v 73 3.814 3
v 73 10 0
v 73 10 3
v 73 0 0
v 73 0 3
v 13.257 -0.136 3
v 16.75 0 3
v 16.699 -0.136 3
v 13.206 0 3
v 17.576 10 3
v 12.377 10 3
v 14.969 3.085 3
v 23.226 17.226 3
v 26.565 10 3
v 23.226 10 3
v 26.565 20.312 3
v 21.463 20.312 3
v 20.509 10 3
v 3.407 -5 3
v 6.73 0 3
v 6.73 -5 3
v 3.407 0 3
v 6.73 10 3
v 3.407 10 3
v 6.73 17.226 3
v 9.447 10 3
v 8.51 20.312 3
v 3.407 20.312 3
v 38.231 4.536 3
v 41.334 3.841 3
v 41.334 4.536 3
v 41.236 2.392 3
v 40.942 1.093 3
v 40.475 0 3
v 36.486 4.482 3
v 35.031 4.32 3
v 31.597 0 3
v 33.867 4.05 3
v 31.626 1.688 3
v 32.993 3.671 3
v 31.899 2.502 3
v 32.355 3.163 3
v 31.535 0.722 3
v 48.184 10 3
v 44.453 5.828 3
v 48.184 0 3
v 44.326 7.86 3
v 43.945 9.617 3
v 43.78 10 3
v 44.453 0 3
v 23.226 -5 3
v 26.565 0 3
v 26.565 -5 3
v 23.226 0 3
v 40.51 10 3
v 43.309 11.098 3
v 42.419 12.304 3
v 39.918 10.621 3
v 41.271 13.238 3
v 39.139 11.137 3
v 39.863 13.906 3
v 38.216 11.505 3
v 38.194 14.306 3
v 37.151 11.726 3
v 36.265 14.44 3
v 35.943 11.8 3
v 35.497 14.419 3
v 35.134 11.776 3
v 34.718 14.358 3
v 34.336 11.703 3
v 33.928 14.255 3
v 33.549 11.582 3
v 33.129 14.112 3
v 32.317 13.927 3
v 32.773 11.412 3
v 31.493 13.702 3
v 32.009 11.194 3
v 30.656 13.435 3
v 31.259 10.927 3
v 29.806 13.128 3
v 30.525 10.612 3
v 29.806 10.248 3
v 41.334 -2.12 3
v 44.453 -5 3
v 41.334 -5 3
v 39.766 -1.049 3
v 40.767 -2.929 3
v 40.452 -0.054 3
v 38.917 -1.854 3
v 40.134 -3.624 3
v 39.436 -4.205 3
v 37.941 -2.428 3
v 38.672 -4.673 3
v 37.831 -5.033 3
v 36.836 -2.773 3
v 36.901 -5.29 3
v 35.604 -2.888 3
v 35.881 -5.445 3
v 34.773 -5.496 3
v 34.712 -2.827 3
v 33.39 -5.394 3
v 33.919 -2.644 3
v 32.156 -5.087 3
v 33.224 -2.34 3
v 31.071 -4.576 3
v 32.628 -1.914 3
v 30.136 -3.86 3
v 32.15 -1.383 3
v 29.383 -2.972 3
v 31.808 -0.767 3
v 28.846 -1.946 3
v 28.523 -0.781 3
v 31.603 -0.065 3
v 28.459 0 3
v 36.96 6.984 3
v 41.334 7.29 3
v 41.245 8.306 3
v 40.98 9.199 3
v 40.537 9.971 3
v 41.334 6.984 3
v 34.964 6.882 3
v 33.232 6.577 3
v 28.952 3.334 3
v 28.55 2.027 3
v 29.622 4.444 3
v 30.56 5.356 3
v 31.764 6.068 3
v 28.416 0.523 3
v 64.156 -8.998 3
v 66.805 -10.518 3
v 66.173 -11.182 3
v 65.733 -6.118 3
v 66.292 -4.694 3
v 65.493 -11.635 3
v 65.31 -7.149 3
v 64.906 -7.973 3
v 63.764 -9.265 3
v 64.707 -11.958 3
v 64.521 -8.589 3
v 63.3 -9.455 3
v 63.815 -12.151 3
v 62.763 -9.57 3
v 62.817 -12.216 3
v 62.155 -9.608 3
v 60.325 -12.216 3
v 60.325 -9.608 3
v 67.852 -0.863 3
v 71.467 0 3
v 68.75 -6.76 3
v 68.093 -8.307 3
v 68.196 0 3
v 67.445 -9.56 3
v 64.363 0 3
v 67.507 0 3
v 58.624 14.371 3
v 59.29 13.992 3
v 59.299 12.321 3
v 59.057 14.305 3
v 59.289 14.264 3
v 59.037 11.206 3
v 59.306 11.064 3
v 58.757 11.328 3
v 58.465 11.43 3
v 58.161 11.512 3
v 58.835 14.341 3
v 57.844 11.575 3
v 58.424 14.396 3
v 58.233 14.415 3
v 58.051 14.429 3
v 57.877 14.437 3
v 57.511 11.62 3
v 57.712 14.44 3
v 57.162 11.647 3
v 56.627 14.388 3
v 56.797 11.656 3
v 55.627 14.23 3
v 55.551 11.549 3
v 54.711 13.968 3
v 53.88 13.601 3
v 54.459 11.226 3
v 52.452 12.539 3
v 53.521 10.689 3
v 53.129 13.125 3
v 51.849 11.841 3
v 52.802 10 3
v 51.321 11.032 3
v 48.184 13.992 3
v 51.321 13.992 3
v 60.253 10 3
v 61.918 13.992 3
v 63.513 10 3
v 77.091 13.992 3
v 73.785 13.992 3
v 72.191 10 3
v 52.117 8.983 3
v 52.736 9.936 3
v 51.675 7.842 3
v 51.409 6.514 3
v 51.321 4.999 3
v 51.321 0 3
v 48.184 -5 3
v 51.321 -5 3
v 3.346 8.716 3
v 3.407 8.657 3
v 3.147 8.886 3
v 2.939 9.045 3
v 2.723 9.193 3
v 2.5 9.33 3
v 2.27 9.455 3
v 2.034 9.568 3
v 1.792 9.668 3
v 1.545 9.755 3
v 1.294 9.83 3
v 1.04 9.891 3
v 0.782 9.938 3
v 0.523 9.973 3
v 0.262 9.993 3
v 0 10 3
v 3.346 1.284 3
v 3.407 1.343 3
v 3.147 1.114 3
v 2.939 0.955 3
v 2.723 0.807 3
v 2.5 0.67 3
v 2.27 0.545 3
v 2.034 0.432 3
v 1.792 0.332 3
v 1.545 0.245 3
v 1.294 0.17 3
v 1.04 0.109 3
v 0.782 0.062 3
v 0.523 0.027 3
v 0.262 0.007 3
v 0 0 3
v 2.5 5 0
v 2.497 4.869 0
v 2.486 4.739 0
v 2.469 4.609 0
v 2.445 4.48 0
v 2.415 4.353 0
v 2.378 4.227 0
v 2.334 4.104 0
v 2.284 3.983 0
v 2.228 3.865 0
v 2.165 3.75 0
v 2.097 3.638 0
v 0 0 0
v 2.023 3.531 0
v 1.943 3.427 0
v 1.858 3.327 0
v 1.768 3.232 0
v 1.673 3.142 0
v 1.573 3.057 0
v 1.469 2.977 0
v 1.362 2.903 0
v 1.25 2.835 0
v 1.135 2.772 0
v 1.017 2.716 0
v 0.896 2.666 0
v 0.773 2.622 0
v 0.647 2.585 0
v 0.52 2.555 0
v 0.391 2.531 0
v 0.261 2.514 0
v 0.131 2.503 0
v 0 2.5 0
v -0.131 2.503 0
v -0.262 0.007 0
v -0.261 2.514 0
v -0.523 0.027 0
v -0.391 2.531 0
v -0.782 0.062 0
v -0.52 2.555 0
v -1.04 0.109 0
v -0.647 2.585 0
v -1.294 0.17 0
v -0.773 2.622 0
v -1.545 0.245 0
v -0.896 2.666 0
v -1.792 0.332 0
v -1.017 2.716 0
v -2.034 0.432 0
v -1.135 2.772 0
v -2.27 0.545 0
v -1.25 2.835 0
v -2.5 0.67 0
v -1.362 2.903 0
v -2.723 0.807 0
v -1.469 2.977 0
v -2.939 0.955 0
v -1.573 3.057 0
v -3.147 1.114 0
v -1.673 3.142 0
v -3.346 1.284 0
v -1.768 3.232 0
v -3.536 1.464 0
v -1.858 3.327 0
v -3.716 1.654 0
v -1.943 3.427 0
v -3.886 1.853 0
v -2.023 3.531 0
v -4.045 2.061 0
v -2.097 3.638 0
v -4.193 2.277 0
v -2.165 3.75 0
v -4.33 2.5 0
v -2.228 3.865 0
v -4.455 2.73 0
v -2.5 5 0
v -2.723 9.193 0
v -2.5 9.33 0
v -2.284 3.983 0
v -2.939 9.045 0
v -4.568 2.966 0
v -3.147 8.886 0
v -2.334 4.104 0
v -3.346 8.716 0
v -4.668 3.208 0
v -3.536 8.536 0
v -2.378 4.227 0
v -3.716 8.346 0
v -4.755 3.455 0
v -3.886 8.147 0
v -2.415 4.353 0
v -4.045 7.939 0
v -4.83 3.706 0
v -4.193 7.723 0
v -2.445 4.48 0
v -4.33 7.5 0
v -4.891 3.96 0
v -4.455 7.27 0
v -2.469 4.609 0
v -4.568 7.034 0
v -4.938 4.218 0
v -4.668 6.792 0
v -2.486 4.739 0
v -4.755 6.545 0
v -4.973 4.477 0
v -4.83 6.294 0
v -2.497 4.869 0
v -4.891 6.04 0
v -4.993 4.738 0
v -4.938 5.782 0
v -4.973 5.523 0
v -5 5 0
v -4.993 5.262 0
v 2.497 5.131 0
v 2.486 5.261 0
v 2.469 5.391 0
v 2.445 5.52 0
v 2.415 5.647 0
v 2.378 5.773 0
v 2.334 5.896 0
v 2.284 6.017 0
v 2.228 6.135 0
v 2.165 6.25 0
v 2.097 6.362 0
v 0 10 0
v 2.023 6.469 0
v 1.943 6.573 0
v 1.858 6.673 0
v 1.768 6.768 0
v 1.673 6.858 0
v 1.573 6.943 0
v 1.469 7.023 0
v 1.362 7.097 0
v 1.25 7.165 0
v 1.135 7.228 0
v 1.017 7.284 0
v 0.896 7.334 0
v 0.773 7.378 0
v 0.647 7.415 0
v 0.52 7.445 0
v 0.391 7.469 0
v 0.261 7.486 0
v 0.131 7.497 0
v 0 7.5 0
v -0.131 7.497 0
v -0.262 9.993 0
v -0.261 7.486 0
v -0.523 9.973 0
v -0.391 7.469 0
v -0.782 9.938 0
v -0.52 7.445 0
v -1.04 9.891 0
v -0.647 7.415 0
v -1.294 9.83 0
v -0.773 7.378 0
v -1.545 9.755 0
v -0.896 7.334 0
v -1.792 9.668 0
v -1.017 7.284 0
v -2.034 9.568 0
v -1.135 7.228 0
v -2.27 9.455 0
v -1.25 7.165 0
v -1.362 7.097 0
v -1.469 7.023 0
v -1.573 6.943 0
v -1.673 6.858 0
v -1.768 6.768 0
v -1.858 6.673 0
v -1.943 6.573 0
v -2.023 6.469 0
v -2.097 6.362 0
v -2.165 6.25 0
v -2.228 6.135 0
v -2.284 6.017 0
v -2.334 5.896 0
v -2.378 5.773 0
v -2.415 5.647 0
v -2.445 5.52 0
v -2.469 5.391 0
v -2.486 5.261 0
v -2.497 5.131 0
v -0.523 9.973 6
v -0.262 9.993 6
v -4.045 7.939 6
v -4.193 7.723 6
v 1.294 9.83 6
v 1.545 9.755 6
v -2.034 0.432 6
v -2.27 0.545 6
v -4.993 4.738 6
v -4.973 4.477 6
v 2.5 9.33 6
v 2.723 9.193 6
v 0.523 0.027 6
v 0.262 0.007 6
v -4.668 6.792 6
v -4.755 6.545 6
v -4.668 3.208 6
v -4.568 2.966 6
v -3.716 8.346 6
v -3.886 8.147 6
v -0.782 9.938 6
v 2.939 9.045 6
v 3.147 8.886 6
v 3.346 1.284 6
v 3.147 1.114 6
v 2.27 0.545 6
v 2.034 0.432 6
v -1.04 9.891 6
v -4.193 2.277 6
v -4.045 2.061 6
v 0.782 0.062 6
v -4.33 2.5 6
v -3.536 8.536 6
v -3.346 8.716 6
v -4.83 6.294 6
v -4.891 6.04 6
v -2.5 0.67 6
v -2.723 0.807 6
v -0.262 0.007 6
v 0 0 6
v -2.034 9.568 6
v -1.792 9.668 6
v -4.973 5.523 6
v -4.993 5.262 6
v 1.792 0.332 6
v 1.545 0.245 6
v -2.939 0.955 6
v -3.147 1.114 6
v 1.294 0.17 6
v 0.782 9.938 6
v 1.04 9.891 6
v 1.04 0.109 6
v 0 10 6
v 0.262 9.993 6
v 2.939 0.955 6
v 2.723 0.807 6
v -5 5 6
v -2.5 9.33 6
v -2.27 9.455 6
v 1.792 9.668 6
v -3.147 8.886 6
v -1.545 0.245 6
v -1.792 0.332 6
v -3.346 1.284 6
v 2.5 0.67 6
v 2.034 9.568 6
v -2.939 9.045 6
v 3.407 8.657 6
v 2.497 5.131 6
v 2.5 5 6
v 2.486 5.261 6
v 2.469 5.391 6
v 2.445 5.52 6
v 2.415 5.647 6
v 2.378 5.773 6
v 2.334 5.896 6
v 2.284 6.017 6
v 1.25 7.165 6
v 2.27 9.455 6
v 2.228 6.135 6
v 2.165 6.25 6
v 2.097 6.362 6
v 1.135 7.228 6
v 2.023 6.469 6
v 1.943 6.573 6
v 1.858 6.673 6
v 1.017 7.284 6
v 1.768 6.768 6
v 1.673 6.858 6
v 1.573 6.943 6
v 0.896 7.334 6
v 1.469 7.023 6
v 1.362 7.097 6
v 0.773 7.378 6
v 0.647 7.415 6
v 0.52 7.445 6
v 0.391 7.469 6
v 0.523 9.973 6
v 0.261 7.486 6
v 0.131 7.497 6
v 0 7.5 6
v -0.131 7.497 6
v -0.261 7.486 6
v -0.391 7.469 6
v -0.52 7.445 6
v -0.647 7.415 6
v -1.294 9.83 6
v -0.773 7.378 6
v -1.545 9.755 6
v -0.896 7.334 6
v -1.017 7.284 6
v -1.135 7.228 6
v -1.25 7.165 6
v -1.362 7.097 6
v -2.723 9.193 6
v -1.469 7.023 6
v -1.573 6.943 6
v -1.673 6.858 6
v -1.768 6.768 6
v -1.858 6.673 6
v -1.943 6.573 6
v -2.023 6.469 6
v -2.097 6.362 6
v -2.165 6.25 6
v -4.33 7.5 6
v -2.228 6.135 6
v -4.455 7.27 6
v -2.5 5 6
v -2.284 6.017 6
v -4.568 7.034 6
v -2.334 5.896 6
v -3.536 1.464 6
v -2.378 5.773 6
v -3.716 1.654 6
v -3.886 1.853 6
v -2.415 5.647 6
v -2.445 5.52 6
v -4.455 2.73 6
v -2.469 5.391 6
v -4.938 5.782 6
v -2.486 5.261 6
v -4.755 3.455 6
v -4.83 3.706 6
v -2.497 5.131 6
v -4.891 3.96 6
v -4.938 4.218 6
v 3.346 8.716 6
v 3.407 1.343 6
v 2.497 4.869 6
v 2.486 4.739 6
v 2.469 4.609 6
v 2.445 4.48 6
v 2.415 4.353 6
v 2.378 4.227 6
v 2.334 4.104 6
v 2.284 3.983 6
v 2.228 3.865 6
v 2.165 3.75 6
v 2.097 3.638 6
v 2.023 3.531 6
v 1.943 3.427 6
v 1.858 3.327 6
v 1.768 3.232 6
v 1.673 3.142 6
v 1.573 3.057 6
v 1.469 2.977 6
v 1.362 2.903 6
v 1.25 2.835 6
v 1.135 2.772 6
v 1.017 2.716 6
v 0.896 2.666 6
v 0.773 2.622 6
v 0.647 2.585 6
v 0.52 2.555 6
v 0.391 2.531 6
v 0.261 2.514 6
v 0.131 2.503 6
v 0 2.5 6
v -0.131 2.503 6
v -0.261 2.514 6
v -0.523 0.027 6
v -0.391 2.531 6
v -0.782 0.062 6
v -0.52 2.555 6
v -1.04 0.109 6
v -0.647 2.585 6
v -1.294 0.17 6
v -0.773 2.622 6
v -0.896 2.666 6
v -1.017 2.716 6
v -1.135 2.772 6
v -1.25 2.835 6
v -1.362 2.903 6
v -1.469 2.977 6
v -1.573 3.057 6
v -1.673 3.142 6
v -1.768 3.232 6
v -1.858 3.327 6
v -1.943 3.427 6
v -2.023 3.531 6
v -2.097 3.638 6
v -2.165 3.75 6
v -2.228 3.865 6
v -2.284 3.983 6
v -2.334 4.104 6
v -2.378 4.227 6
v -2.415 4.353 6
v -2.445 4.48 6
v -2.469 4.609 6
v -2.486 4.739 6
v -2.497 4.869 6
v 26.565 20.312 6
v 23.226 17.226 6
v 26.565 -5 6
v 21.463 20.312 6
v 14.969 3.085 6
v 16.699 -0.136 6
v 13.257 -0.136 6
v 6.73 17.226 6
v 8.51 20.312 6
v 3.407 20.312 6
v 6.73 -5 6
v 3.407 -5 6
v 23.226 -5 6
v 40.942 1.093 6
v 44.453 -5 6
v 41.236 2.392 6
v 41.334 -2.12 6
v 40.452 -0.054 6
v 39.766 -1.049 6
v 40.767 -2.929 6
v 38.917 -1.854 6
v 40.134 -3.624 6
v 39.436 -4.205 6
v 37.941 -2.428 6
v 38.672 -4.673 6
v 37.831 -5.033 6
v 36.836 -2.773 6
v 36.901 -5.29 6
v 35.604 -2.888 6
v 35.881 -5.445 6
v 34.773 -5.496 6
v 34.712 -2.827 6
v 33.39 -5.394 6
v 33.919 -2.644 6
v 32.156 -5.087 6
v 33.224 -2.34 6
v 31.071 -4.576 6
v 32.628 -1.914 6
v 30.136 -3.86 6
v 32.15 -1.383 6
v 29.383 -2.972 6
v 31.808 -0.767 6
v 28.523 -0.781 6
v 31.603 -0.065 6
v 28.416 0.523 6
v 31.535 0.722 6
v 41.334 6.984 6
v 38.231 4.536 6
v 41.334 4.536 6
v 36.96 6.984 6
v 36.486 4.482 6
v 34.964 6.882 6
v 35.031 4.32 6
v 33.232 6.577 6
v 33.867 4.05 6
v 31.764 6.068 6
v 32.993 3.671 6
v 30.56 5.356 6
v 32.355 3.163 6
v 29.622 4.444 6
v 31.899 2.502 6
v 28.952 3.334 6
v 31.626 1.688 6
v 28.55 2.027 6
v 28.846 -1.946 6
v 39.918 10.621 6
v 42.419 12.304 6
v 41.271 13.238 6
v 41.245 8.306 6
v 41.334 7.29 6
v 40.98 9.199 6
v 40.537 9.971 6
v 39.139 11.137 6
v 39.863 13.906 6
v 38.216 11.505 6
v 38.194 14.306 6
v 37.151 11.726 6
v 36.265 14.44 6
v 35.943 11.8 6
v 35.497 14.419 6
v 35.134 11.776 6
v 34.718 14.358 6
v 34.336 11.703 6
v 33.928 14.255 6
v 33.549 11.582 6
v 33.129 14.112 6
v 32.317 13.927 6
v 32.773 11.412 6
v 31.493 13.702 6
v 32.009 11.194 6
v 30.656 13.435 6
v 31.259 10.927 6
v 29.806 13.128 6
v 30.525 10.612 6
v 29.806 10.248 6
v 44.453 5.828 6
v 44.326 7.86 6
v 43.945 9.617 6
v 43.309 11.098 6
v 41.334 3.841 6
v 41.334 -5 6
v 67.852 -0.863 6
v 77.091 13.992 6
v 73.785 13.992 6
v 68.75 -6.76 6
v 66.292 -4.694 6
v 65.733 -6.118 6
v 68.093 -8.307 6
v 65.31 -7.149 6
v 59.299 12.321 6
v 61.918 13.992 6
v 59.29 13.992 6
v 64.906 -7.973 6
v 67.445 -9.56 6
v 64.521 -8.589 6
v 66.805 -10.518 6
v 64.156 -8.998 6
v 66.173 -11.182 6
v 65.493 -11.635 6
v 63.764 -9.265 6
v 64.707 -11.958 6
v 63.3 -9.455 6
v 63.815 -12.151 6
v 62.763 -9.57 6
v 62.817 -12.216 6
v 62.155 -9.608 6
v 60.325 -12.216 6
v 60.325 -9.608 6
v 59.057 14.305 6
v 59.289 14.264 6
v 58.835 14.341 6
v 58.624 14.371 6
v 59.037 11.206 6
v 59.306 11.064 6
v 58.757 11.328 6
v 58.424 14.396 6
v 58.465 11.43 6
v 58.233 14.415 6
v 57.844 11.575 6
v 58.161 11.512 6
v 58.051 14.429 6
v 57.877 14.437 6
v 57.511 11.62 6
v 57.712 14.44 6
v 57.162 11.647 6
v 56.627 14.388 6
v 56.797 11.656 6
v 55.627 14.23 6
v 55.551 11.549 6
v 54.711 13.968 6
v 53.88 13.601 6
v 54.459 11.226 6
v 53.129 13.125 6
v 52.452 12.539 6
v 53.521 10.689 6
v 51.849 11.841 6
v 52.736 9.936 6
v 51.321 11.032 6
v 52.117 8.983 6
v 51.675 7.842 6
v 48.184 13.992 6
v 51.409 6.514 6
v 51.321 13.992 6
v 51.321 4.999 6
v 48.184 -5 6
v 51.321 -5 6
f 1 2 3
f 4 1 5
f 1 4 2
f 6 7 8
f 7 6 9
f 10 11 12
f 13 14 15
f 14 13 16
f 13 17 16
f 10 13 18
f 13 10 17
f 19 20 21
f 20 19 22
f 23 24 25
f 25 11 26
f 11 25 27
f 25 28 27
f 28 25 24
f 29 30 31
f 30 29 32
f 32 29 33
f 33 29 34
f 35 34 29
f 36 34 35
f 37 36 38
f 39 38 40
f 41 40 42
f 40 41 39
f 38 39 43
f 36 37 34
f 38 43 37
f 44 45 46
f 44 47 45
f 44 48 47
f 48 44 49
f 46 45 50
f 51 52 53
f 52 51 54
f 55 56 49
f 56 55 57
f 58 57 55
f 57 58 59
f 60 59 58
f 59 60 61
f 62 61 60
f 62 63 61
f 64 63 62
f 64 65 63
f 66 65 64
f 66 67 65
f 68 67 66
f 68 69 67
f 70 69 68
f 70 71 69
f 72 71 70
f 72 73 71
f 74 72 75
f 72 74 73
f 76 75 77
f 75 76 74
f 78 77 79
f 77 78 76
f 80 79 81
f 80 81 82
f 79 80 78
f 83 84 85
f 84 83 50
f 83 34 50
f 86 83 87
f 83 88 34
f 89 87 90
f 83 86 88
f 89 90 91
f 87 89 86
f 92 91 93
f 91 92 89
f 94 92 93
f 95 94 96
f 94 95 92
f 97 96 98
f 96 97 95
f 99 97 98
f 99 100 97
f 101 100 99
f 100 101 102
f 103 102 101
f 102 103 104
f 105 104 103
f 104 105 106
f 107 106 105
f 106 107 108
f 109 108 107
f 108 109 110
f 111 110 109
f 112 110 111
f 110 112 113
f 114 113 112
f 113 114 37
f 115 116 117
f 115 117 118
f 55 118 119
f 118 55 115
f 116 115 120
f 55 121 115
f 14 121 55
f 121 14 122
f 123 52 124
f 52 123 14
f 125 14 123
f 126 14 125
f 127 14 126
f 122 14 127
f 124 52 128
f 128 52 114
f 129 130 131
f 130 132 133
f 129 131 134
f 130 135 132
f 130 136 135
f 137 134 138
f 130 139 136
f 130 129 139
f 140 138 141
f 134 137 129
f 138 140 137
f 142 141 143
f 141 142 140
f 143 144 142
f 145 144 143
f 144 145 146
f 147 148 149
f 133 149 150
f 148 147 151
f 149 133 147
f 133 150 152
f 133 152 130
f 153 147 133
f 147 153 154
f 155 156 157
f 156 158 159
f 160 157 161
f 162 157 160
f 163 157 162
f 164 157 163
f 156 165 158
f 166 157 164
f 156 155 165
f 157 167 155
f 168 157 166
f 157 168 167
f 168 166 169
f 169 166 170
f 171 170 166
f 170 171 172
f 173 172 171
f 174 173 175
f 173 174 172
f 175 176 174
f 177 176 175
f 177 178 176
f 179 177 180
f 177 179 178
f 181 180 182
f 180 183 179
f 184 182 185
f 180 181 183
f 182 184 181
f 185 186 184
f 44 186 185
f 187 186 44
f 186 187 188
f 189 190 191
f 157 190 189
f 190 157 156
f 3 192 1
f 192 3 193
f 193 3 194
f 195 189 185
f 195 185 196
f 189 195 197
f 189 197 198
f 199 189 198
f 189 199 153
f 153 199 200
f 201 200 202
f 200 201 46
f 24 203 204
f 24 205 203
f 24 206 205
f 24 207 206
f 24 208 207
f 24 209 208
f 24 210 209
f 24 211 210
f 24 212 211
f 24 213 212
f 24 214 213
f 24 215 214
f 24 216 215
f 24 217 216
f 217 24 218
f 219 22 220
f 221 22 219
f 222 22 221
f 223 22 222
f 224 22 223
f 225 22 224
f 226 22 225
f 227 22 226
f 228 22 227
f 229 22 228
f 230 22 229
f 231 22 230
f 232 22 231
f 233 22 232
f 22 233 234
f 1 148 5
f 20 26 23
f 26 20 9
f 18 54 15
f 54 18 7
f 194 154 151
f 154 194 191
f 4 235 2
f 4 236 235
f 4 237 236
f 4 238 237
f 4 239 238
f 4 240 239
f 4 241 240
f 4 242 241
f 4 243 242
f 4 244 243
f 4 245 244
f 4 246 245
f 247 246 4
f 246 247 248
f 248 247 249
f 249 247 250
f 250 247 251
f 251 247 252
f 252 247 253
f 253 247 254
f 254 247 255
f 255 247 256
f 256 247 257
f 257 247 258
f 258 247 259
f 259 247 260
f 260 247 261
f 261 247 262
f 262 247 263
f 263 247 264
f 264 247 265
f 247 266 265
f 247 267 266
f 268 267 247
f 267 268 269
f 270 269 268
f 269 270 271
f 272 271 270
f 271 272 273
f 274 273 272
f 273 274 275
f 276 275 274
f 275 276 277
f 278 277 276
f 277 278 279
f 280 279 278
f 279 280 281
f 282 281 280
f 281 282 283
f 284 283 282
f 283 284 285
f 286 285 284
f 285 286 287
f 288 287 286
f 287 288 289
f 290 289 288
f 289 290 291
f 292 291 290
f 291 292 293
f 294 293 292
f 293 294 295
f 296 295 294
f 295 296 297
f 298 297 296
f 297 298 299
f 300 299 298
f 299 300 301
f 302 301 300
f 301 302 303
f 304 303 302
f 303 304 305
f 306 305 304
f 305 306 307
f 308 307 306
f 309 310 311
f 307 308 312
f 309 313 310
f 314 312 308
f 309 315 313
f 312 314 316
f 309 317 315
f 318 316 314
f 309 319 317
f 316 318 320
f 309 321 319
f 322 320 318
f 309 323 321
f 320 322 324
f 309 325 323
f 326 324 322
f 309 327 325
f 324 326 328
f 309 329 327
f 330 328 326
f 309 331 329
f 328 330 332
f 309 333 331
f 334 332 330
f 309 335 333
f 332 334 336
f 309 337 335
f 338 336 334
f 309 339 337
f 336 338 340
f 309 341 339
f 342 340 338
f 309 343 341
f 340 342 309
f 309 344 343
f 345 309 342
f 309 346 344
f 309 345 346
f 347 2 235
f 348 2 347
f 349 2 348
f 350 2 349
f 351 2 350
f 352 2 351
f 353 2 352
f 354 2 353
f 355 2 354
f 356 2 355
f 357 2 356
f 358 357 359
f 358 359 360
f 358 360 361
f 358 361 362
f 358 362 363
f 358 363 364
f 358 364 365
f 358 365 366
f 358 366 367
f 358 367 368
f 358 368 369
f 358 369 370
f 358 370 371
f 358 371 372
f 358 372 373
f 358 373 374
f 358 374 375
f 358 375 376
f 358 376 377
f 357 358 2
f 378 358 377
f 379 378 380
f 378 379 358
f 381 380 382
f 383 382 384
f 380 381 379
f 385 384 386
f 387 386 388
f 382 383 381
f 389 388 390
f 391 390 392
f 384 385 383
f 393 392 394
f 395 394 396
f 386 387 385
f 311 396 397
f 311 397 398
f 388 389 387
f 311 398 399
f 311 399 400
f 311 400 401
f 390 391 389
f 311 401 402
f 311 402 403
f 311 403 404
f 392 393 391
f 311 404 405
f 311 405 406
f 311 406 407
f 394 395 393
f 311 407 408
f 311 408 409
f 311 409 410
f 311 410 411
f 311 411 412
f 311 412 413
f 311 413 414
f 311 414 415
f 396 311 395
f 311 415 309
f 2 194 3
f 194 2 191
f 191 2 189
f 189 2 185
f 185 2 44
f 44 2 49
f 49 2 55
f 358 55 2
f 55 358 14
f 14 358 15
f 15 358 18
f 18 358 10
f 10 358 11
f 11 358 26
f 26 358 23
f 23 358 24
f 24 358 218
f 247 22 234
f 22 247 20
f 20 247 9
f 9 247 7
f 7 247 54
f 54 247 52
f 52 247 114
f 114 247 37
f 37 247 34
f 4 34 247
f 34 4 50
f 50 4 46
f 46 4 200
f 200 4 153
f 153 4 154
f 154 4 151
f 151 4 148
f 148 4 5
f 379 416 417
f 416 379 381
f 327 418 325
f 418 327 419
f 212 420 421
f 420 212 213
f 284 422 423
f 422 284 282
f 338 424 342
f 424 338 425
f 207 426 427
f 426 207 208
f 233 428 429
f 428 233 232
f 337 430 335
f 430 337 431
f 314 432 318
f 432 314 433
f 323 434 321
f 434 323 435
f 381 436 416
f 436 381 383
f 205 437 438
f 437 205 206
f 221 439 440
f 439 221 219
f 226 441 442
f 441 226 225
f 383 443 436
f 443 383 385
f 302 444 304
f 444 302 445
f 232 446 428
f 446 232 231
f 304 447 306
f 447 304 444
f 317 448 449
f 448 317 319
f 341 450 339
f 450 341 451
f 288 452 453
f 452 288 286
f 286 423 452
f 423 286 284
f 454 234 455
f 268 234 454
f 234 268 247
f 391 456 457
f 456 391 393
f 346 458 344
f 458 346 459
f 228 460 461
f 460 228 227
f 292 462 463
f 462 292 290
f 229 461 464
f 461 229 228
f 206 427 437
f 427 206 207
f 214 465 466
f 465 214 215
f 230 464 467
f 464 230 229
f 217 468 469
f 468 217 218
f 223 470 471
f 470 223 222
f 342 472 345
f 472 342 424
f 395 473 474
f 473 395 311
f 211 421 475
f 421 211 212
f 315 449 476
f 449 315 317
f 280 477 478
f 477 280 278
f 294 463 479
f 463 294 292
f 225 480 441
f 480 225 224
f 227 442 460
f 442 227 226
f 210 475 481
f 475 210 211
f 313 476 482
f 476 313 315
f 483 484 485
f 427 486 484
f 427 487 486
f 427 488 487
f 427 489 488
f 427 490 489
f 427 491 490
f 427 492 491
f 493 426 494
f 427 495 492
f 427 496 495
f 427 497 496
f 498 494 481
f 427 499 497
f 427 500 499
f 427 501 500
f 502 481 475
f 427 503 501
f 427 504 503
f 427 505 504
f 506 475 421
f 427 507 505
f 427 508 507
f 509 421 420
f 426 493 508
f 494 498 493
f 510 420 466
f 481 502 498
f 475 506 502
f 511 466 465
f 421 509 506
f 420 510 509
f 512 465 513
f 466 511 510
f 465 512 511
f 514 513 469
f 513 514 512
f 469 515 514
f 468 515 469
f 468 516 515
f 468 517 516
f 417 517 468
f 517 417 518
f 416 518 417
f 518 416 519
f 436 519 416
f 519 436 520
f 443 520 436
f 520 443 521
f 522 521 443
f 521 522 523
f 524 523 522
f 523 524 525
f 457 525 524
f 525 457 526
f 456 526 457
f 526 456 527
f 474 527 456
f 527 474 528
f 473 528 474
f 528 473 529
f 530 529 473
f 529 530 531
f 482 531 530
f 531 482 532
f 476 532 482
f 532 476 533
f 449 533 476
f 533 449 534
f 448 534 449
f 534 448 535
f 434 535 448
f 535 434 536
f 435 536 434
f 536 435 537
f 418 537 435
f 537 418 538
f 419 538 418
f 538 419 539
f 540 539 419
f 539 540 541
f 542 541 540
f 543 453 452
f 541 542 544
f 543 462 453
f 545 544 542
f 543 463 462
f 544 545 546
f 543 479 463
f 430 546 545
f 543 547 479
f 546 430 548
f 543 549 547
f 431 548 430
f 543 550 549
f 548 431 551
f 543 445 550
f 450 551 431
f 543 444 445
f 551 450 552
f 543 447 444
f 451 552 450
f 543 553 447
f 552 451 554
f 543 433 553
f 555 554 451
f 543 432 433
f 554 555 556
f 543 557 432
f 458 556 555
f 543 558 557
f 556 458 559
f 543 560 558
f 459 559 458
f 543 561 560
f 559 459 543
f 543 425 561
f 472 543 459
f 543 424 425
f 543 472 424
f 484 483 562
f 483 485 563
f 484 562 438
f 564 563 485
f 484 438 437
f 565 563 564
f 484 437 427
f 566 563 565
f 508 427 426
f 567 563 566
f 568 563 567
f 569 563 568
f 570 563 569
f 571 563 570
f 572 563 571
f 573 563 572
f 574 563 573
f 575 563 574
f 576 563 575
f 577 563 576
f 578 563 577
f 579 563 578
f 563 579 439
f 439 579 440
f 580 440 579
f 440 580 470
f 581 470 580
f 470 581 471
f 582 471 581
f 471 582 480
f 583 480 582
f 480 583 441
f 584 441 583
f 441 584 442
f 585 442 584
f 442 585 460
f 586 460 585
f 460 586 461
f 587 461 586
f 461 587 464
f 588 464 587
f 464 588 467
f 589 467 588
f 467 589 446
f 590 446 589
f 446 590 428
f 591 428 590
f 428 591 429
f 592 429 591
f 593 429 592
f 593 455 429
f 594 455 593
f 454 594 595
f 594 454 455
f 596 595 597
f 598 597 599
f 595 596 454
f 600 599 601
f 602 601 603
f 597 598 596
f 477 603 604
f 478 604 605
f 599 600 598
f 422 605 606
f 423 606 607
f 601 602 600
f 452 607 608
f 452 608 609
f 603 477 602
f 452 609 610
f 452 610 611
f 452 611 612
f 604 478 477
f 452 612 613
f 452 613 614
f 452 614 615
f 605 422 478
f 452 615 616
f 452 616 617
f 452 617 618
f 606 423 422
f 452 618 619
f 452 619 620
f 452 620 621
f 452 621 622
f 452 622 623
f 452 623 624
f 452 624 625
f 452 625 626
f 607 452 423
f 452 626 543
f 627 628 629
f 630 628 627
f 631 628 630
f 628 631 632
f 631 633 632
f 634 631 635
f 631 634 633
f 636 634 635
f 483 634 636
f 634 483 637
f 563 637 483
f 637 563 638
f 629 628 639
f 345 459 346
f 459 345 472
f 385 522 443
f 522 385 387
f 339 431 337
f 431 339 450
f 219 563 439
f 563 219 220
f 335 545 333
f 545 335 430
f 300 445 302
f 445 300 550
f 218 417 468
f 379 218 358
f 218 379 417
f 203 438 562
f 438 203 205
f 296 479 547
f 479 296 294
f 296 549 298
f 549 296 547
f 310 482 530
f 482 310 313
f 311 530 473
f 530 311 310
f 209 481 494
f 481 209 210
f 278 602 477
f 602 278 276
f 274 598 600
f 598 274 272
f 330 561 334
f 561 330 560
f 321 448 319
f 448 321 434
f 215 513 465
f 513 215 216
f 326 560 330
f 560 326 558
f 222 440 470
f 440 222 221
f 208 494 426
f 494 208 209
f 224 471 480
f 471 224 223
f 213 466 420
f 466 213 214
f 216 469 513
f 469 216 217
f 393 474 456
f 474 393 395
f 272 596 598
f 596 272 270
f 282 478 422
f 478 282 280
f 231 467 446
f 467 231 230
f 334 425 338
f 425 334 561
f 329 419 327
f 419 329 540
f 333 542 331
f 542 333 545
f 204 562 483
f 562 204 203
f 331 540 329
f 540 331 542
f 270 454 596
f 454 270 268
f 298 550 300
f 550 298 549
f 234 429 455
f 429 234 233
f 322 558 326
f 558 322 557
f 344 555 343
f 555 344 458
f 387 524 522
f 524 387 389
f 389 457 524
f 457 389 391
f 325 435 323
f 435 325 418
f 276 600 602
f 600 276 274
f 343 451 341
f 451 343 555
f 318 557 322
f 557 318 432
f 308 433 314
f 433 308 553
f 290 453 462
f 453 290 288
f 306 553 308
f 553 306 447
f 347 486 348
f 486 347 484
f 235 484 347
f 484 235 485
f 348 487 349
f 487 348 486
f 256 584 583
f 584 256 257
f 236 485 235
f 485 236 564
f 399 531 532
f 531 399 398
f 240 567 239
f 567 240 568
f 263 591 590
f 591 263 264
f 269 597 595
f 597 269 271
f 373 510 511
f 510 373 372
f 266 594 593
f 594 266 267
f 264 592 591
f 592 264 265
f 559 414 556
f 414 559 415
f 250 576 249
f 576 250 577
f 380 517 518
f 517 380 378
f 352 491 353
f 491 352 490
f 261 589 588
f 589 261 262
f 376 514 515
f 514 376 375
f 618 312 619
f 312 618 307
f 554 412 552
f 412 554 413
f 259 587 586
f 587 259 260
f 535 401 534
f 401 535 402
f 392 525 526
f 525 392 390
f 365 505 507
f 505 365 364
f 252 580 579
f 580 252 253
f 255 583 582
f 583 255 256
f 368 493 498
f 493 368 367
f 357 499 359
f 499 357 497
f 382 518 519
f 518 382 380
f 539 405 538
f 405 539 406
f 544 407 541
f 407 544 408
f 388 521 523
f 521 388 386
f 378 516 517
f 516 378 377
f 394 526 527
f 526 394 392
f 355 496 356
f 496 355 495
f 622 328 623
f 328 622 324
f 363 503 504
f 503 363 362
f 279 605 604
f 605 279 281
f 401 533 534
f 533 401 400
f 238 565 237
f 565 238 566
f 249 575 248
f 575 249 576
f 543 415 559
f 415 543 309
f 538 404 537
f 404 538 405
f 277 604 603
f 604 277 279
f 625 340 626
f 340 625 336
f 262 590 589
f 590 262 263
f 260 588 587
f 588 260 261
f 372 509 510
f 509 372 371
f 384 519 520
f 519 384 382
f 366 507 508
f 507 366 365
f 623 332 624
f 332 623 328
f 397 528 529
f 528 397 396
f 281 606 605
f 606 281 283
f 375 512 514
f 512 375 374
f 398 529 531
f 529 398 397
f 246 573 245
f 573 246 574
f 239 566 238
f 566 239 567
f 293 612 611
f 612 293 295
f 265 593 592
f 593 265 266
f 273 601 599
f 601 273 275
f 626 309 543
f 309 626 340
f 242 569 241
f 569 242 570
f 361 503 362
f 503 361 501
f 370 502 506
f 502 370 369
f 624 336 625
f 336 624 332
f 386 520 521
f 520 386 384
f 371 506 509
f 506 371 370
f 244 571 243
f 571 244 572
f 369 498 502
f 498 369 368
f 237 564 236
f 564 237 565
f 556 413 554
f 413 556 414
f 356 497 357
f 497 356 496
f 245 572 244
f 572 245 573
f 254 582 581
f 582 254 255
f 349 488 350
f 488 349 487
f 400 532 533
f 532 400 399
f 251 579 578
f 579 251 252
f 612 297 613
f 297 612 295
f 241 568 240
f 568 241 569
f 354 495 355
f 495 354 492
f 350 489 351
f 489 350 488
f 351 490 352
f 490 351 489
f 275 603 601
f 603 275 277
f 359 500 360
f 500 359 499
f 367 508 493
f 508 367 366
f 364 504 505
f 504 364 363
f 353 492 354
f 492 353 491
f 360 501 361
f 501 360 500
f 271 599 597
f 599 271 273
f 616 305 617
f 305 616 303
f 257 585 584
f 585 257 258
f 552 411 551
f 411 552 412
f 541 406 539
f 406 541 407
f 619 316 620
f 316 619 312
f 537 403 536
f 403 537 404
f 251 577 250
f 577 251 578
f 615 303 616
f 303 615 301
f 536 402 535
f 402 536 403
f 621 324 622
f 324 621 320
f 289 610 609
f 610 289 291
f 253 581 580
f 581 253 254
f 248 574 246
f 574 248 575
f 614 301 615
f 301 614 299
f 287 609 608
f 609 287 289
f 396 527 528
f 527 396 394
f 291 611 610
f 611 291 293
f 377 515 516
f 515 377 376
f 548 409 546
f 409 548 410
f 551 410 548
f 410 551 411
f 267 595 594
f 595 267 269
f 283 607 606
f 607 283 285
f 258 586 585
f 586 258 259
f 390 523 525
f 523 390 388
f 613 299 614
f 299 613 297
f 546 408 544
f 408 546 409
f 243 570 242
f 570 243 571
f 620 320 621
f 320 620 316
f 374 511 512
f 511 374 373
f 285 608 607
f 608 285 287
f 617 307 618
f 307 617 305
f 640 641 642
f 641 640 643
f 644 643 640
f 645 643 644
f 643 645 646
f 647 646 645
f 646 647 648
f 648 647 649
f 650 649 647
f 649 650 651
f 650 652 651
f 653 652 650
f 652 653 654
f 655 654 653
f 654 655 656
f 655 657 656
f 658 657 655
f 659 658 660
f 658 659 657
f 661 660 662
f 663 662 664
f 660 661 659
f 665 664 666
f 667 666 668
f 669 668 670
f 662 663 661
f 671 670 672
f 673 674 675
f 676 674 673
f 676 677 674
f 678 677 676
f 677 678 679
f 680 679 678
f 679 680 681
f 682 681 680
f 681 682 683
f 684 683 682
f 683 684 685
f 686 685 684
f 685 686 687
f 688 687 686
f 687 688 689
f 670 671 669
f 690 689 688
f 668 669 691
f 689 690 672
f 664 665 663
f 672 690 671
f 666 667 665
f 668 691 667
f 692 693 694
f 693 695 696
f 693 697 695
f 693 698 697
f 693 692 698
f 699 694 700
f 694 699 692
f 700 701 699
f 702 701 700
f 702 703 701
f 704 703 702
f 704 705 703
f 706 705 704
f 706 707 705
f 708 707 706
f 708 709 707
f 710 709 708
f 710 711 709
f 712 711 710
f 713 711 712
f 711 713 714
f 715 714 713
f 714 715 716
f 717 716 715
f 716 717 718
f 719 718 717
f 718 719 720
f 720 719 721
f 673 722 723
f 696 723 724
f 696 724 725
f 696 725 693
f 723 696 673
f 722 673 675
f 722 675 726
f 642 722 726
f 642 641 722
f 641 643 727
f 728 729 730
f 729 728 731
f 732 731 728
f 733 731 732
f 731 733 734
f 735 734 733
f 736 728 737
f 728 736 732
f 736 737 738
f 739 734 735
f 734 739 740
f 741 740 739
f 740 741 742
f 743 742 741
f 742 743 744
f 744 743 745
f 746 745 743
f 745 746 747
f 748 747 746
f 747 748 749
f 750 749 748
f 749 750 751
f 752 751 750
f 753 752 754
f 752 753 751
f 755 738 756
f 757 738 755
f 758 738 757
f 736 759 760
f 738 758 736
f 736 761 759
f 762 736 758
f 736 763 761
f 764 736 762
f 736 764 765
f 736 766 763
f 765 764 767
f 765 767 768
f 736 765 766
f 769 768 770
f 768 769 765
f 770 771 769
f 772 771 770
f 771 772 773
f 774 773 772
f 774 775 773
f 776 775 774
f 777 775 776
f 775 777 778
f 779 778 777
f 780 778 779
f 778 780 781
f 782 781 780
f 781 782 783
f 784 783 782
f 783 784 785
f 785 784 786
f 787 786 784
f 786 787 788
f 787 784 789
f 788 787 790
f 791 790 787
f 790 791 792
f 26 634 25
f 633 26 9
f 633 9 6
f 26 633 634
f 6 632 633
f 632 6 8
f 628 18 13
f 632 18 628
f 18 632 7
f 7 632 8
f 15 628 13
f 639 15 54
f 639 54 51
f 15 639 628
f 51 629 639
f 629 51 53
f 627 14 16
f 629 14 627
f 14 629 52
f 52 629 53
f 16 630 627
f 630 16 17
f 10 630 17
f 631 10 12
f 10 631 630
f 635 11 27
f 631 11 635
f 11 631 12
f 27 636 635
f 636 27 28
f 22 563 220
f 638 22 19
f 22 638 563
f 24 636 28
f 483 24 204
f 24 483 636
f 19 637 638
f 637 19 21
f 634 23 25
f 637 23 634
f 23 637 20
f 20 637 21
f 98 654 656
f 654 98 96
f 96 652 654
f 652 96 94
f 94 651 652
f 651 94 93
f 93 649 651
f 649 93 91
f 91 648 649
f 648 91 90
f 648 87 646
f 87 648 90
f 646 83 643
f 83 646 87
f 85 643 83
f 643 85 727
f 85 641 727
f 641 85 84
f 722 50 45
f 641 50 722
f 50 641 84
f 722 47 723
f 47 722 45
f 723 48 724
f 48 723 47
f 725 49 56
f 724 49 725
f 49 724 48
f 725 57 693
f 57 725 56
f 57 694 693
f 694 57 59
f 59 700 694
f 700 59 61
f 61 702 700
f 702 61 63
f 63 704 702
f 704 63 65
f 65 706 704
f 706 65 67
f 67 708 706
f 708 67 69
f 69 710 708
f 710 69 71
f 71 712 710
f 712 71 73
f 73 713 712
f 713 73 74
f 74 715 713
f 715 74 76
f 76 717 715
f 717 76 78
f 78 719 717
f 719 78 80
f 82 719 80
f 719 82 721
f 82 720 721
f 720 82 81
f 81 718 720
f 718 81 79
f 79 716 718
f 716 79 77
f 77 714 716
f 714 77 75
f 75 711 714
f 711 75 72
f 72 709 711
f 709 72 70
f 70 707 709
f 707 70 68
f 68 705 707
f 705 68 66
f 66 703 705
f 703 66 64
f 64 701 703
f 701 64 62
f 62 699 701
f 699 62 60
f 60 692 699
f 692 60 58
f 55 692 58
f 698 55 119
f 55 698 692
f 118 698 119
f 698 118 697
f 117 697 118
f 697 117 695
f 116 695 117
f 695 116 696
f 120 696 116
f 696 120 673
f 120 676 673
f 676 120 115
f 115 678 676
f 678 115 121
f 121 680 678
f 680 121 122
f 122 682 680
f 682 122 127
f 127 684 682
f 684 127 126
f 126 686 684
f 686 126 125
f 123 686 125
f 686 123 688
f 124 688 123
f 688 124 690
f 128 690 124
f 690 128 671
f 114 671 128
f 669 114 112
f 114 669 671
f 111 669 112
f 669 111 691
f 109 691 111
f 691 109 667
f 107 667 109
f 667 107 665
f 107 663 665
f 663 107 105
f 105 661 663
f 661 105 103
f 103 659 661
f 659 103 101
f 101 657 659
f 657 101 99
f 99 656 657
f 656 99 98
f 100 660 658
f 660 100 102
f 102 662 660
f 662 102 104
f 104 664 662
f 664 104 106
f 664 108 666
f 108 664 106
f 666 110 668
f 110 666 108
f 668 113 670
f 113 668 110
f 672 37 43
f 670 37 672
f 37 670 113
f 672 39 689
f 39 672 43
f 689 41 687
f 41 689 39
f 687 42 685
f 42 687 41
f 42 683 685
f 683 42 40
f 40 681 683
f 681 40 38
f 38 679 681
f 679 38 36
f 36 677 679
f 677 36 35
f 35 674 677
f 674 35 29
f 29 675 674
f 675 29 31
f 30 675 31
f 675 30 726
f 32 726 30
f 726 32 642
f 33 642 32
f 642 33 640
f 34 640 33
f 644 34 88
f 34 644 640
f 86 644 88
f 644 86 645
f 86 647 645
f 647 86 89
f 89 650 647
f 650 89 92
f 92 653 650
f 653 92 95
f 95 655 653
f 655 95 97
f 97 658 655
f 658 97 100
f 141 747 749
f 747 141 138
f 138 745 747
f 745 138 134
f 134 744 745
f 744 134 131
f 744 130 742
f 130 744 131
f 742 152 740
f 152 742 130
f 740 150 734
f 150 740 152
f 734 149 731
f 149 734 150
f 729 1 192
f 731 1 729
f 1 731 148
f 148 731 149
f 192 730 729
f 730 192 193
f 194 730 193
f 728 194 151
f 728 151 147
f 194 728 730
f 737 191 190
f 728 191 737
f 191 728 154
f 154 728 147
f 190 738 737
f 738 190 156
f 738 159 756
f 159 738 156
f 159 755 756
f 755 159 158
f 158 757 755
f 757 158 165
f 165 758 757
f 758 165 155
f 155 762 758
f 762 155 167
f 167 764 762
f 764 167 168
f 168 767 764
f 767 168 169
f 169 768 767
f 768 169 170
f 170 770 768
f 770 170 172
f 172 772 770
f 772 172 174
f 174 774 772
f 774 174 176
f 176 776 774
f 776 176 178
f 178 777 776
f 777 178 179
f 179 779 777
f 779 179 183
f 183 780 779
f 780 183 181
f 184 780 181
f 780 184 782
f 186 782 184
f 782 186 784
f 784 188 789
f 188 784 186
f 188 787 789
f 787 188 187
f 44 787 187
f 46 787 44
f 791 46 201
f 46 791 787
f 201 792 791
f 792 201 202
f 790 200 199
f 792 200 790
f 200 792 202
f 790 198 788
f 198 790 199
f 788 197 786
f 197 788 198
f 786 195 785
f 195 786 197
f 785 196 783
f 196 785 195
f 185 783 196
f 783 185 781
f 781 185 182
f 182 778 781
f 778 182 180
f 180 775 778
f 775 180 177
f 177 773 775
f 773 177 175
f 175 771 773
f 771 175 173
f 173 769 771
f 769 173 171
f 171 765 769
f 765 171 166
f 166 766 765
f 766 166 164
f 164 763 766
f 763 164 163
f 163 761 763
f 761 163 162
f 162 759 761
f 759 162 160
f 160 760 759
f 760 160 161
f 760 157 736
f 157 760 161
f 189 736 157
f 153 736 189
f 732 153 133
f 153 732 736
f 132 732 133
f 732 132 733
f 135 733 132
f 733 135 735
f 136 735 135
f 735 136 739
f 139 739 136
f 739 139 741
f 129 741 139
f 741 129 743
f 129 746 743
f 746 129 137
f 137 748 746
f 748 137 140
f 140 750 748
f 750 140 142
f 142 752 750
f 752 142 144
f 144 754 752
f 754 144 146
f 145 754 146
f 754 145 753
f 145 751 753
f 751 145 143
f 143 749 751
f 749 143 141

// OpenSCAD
res = 120;

difference(){
    union(){
        cube([73,10,3]);
        translate([0,5,0]) cylinder($fn=res, d=10, h=6);
    }
    translate([0,5,0]) cylinder($fn=res, d=5, h=6);
}
translate([0,-5,3]) linear_extrude(3) text("Mary", size=25, spacing=0.9, font="DejaVu Sans");
